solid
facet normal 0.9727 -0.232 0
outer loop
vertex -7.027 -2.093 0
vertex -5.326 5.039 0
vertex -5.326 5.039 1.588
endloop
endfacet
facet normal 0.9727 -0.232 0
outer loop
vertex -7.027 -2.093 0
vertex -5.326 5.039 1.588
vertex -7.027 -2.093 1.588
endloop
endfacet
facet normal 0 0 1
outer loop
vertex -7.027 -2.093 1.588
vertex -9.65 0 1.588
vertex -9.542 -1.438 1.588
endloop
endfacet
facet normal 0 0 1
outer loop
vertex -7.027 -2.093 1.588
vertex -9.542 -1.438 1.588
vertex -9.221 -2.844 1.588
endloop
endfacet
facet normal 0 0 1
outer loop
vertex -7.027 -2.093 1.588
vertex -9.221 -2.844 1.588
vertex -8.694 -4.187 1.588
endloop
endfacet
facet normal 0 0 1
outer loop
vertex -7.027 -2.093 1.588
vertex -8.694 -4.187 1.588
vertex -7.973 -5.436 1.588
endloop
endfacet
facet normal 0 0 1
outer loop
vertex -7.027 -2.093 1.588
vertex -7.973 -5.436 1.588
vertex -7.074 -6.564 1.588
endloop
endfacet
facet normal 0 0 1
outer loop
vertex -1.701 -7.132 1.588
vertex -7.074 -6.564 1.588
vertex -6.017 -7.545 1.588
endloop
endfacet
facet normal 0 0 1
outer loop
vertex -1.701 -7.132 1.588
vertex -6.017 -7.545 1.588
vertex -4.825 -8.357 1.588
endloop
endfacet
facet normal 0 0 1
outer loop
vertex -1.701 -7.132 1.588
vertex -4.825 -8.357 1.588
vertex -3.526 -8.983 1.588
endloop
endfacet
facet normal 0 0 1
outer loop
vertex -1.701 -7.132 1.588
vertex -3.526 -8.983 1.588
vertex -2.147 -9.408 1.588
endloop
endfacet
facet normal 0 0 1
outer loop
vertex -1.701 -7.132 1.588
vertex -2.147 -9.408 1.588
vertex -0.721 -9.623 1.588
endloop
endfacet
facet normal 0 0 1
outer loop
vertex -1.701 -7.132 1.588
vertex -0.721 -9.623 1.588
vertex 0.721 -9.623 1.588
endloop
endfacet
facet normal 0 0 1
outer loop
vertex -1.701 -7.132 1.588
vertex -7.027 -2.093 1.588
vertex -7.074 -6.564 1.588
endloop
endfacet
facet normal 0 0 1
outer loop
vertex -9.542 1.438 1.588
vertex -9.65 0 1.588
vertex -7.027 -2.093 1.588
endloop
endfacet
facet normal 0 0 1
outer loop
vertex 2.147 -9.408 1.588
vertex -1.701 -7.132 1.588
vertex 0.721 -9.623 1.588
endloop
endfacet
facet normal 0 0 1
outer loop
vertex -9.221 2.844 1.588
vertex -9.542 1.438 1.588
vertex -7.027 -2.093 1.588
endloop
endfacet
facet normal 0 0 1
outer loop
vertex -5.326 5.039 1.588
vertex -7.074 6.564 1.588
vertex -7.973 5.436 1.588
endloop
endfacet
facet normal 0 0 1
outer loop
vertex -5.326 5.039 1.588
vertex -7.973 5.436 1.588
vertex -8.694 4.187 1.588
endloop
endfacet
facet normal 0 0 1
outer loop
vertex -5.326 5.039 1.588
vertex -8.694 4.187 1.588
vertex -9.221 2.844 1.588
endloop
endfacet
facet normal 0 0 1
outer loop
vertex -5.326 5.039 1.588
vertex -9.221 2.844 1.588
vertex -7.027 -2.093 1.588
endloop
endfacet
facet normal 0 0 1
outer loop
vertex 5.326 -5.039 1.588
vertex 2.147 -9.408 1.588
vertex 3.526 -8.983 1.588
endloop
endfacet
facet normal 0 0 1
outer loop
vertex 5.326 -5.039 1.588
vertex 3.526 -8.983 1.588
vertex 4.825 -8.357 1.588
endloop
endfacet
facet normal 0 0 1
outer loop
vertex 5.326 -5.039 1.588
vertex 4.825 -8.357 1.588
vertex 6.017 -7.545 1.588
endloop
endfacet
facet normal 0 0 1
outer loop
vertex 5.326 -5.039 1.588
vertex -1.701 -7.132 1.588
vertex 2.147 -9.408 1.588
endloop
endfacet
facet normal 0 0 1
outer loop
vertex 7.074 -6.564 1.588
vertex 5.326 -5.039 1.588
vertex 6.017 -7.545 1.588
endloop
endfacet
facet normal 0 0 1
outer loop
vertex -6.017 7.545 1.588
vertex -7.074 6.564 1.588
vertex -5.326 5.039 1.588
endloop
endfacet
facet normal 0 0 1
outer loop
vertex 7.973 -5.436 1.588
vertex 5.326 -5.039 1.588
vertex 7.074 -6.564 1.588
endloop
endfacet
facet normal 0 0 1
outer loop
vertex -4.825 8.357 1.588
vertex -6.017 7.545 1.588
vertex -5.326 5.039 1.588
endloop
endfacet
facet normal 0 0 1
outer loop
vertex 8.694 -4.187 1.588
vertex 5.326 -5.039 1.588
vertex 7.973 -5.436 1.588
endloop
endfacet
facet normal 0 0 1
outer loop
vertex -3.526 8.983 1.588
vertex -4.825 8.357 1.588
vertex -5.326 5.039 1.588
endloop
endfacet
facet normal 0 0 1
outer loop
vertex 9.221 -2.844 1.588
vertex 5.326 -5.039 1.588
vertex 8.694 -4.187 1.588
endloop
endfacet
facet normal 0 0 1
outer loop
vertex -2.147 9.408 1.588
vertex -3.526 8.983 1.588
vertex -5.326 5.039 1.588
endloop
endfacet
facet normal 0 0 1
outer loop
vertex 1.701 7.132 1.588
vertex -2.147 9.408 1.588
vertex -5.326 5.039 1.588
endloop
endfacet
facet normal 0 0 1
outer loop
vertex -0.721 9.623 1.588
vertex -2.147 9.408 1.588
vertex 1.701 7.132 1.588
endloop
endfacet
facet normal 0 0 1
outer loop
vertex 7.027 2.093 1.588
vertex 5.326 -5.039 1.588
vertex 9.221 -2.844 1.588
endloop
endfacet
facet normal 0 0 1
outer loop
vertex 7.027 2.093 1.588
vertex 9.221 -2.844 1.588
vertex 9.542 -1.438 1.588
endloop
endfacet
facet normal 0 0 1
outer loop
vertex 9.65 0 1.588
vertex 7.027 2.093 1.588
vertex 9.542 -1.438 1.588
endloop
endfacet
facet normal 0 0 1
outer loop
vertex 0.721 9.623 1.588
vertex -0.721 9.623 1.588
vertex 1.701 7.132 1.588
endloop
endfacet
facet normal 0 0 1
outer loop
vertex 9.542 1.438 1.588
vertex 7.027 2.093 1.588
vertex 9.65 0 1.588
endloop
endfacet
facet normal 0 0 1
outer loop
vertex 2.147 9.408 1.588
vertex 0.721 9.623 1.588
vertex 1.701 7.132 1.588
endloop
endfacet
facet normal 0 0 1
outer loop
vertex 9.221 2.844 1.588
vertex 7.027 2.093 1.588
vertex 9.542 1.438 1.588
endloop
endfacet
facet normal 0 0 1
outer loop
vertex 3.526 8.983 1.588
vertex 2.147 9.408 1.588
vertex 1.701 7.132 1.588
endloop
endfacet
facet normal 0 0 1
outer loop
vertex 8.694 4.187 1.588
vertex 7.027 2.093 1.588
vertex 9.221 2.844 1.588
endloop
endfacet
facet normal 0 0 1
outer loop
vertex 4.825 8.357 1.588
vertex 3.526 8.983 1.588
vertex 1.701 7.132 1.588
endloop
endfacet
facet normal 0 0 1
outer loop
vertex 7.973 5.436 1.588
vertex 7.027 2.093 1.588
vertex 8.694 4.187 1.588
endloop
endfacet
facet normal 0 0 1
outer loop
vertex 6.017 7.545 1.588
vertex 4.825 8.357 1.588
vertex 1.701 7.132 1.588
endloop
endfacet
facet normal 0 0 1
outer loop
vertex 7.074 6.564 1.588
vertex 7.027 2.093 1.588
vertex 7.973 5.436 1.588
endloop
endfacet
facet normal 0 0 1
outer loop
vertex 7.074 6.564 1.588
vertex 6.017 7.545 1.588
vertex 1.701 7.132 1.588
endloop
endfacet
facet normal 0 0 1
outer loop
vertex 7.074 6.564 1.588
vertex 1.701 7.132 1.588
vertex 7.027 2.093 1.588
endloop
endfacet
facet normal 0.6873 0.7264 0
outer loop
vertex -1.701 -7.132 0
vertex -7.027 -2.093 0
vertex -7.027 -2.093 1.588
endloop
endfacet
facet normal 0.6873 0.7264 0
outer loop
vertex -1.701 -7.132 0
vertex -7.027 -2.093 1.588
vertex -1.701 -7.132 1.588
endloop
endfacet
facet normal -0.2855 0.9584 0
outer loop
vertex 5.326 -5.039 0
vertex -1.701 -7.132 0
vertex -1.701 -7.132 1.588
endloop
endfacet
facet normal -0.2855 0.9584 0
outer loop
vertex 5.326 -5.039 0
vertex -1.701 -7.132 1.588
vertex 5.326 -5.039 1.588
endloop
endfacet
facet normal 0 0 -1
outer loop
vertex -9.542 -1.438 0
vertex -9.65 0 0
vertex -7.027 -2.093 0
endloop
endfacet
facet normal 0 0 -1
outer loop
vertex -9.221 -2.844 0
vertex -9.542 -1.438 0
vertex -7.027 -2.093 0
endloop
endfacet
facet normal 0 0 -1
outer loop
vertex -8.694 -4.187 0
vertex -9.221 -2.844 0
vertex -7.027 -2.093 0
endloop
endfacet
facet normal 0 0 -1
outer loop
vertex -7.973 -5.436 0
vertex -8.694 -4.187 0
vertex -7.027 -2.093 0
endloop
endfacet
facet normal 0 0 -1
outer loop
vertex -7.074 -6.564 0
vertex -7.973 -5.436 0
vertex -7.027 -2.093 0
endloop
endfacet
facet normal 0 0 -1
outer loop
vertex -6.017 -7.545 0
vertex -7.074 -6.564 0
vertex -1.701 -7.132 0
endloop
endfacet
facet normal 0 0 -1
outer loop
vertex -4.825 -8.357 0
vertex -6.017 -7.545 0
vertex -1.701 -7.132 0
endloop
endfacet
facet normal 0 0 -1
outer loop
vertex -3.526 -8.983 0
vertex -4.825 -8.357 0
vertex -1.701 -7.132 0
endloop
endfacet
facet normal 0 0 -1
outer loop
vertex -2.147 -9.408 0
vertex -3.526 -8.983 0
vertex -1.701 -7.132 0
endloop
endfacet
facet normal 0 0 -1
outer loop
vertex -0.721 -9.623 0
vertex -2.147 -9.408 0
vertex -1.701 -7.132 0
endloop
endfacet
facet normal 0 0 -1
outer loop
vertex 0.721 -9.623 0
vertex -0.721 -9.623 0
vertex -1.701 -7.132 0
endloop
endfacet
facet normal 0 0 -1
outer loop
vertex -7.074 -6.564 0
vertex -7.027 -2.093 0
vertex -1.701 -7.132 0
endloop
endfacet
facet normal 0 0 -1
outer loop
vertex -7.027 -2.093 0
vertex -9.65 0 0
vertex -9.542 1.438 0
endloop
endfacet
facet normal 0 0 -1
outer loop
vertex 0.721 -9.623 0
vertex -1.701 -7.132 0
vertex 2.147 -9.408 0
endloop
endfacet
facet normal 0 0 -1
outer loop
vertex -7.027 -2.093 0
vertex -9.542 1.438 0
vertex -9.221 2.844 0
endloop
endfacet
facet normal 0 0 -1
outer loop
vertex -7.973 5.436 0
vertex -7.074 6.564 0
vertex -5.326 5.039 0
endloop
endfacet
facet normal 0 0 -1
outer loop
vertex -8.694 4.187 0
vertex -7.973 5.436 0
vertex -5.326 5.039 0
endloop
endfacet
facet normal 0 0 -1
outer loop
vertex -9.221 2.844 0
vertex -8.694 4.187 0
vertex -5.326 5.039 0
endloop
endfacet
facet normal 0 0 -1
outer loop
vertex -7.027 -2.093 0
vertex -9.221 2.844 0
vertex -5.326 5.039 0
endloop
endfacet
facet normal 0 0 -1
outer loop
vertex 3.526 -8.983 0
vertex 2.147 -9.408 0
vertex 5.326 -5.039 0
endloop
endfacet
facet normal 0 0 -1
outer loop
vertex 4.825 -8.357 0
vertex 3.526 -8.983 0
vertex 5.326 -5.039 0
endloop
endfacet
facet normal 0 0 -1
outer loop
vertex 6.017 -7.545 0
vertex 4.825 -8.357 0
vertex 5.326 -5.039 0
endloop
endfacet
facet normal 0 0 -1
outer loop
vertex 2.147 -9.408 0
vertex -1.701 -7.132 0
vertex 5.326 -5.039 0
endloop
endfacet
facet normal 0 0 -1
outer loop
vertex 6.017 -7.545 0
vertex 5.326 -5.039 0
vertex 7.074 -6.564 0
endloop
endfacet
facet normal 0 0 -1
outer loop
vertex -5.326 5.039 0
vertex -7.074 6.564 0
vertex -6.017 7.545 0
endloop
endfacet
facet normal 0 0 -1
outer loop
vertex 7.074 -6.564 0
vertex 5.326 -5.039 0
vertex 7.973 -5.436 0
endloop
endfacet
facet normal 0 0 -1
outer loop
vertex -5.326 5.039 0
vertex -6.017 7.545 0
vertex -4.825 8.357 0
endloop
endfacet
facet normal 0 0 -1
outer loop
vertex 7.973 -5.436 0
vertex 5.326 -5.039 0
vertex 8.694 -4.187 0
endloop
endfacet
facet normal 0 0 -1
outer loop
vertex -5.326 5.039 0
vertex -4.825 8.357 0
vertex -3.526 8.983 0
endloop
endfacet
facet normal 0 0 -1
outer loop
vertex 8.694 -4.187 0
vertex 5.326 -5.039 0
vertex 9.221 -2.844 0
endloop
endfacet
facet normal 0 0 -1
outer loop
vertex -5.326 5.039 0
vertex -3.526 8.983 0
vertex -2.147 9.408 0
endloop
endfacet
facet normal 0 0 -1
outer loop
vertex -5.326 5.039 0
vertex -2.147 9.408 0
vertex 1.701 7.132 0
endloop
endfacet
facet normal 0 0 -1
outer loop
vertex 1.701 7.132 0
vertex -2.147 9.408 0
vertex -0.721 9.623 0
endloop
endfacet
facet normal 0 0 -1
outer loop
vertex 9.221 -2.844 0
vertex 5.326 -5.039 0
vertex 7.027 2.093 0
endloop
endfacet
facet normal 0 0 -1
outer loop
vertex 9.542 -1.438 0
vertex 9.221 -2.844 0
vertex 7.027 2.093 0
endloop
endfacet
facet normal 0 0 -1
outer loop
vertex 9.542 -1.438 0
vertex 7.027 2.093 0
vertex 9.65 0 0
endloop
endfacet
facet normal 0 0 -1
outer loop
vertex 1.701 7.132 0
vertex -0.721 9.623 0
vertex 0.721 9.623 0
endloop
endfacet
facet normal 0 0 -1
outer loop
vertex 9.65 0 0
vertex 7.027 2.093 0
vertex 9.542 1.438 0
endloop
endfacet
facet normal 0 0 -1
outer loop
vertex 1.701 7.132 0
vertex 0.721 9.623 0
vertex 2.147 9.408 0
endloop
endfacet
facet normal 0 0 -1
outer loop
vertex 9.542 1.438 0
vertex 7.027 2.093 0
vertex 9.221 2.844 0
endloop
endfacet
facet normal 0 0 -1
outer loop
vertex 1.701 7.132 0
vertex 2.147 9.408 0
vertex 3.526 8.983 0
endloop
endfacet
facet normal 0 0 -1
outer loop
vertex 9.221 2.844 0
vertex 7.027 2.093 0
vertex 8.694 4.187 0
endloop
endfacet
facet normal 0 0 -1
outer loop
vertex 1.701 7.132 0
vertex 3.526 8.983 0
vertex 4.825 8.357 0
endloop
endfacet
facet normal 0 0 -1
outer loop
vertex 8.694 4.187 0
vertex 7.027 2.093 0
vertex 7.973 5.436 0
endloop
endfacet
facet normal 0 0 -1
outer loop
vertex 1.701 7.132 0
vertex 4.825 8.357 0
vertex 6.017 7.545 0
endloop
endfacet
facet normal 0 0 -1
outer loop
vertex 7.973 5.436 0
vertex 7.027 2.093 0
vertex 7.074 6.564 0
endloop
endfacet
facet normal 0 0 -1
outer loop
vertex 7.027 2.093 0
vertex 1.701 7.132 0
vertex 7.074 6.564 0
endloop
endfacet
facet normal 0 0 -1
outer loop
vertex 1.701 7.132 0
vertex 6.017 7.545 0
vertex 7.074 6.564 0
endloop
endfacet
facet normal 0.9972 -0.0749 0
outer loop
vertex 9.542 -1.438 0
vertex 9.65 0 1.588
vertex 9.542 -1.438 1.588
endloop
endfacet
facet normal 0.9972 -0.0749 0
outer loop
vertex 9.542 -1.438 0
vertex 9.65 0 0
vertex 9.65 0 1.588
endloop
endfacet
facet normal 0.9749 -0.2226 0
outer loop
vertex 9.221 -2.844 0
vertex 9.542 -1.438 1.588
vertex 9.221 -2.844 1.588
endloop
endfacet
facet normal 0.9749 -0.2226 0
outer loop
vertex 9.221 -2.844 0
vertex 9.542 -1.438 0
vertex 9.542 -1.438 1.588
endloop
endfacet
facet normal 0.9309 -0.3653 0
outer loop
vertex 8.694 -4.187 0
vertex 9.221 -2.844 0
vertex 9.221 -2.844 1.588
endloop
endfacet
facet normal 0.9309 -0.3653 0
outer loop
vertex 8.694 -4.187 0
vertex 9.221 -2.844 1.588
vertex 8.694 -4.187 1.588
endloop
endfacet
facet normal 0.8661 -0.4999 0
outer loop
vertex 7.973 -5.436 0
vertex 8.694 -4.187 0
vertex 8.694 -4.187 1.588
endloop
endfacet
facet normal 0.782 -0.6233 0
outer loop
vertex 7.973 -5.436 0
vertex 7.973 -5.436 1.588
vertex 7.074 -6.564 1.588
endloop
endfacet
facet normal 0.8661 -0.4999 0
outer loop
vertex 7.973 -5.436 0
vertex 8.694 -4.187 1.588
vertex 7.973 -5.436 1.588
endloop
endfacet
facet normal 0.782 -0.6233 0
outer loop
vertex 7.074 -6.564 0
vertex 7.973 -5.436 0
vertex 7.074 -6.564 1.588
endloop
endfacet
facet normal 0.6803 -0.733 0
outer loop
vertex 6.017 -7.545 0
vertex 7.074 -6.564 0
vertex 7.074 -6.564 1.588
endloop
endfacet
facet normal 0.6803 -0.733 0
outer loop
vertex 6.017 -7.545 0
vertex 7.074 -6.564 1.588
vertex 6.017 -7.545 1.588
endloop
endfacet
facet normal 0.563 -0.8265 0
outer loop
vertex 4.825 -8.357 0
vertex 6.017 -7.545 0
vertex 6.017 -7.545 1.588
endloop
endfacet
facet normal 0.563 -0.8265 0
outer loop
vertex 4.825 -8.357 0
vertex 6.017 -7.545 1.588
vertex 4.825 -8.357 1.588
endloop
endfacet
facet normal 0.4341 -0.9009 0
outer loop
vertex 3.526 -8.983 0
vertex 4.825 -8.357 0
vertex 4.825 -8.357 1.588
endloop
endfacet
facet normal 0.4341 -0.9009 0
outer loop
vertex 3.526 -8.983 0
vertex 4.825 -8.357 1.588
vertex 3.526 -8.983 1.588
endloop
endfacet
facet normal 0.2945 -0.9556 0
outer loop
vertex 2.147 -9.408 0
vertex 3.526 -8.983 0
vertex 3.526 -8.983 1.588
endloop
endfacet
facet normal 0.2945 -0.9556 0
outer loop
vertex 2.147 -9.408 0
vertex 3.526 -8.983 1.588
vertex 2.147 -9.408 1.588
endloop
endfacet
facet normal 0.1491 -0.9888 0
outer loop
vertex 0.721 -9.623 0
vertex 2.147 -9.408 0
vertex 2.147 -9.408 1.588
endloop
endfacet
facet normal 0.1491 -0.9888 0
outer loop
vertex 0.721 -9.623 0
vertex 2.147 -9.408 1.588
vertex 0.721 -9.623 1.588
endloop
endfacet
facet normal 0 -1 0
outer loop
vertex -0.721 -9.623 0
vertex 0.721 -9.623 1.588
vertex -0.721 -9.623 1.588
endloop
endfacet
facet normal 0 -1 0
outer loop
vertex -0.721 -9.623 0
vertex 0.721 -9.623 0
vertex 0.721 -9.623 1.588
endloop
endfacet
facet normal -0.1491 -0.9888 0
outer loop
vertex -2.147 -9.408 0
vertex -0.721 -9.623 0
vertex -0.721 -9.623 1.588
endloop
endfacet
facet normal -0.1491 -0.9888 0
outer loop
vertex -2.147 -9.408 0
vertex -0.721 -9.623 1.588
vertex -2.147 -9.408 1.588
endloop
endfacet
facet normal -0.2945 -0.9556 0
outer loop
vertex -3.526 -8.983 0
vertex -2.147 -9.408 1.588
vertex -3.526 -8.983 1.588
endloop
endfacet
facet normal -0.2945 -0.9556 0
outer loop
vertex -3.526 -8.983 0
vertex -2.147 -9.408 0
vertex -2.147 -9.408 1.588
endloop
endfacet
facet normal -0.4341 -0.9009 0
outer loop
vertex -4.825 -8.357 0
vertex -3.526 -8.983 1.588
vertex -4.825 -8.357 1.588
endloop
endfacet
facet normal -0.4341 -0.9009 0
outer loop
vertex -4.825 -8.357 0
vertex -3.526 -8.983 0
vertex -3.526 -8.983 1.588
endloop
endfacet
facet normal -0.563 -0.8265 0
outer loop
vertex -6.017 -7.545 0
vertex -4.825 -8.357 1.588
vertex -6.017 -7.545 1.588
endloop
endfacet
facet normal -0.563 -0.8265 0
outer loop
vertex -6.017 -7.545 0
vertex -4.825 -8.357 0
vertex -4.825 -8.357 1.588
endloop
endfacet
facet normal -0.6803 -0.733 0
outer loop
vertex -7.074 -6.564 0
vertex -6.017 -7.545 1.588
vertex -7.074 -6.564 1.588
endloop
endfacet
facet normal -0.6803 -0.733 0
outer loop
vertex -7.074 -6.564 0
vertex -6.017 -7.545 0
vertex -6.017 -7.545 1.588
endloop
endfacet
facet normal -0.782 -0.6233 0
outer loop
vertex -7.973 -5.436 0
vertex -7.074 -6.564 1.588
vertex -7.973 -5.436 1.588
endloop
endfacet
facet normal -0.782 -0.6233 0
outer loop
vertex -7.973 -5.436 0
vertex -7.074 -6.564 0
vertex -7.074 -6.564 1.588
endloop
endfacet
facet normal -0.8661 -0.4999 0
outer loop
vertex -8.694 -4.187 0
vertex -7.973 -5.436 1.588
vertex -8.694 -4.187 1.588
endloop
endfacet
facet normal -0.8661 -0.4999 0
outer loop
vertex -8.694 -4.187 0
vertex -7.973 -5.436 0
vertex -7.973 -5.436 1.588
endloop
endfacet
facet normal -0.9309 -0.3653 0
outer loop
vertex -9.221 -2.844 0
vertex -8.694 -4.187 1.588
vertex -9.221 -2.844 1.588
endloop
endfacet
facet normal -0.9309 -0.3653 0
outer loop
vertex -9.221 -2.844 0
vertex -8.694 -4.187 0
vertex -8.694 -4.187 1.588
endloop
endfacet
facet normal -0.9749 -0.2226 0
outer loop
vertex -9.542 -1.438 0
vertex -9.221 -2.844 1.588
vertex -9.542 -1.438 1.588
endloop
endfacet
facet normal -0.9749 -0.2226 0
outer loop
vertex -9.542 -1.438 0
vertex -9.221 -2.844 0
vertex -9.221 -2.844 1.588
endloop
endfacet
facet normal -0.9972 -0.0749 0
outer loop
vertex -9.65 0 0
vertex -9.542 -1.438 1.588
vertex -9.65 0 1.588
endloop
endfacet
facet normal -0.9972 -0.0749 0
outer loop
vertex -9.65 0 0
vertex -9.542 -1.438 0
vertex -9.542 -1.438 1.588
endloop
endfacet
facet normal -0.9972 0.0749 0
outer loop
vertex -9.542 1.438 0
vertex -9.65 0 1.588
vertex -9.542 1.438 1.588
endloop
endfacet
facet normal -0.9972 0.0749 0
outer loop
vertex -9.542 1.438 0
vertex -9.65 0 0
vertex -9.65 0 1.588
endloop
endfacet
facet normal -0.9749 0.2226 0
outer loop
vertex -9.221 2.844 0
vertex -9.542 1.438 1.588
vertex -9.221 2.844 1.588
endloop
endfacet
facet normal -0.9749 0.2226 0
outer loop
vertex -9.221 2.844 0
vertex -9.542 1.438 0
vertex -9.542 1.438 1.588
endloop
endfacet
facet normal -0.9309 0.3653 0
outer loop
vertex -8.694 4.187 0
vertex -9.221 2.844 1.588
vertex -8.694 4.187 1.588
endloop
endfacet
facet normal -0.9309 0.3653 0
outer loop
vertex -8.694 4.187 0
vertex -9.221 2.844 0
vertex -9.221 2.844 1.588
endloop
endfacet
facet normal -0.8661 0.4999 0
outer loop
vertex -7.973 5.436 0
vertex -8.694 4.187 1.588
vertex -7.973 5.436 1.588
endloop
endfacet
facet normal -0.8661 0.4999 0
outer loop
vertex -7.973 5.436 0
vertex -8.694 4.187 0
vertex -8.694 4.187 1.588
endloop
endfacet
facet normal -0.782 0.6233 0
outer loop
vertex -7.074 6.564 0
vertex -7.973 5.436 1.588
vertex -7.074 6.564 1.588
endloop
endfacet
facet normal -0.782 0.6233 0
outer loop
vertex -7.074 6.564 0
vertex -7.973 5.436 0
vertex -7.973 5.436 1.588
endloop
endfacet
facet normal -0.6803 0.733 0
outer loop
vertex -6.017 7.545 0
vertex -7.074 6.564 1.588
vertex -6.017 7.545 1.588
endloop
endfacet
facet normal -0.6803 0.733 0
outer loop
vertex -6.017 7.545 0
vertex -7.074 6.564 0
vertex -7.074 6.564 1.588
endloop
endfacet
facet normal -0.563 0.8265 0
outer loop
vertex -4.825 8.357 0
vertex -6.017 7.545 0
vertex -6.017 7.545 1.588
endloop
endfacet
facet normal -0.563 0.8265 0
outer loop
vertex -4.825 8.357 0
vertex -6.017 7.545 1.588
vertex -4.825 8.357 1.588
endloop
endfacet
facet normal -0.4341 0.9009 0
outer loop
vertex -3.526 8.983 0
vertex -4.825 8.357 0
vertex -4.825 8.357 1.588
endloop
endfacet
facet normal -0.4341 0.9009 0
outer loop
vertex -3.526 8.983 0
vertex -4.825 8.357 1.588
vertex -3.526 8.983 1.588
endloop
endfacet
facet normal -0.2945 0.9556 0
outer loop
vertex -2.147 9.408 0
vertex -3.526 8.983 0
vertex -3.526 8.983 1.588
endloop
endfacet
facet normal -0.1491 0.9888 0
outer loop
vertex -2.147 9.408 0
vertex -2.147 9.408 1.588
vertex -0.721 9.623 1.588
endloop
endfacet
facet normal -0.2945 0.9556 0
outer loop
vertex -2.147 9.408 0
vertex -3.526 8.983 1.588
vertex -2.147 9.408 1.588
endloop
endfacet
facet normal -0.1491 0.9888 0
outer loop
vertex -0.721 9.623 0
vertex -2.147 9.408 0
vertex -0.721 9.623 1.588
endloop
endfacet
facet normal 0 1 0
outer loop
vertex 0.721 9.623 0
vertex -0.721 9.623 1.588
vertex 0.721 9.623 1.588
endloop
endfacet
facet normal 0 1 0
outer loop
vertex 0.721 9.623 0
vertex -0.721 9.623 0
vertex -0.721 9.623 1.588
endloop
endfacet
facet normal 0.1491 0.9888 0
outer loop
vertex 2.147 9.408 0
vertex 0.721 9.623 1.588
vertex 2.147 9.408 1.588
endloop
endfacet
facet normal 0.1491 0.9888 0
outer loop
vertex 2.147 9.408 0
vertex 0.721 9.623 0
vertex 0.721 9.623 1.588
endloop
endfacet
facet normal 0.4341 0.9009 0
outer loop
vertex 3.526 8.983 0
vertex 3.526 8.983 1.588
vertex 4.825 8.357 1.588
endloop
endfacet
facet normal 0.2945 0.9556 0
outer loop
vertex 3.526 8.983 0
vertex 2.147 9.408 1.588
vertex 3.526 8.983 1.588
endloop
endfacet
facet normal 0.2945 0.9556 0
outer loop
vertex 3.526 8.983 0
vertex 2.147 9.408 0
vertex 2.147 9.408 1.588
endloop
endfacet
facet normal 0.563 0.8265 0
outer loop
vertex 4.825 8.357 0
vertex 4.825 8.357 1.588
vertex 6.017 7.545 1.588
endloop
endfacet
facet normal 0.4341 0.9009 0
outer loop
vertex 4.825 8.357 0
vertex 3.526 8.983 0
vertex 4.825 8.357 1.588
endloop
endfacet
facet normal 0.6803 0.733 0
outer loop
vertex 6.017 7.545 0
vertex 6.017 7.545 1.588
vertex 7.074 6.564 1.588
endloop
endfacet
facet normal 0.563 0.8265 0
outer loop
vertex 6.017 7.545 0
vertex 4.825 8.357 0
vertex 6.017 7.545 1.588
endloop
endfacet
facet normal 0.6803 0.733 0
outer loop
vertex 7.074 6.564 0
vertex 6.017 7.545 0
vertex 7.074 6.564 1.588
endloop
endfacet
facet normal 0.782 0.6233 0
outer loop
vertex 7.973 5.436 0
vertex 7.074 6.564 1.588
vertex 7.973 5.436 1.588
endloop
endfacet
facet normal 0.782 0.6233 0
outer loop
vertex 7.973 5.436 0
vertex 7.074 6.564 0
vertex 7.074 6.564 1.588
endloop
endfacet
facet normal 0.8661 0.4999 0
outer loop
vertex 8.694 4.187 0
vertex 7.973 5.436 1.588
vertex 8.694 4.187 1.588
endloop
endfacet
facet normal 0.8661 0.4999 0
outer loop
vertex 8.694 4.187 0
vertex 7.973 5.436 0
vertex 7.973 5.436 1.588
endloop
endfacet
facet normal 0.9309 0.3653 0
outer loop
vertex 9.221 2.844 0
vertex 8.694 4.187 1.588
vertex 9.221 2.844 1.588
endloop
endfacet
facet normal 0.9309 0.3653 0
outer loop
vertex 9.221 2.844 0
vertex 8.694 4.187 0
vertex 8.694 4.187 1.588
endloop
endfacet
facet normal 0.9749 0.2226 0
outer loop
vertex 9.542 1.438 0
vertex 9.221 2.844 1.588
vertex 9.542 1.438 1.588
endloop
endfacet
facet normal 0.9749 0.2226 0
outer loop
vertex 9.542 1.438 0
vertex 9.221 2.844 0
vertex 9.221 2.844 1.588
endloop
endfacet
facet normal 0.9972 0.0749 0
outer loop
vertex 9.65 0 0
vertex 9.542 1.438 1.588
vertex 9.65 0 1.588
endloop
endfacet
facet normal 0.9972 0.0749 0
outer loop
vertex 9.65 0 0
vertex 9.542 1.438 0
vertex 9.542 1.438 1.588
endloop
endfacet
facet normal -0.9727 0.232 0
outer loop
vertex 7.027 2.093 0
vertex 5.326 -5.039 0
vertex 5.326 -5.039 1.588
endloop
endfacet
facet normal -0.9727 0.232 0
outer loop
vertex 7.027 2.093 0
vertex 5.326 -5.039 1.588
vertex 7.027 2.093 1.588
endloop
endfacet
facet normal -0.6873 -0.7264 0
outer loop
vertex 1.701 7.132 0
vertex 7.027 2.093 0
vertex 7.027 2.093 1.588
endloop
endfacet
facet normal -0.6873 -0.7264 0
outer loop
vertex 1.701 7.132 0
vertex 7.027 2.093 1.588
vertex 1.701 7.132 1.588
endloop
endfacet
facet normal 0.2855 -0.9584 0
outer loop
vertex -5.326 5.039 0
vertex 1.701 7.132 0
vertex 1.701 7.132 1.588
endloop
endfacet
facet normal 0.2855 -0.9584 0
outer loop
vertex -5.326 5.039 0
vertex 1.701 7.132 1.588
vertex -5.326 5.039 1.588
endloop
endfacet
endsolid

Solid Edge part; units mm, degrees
sketch "Sketch1" plane through (0, 0, 0) normal (0, 0, 1) x (1, 0, 0)
  circle A0 centre (0, 0) radius 9.65
  line L0 (-7.0272, -2.0932) -> (-1.7009, -7.1323)
  line L1 (-1.7009, -7.1323) -> (5.3263, -5.0392)
  line L2 (5.3263, -5.0392) -> (7.0272, 2.0932)
  line L3 (7.0272, 2.0932) -> (1.7009, 7.1323)
  line L4 (1.7009, 7.1323) -> (-5.3263, 5.0392)
  line L5 (-5.3263, 5.0392) -> (-7.0272, -2.0932)
  dimension "D1" = 19.3
  dimension "D2" = 12.7
extrude "Protrusion1" add sketch "Sketch1" along normal blind 1.5875
properties part number "BumbleB0537"
